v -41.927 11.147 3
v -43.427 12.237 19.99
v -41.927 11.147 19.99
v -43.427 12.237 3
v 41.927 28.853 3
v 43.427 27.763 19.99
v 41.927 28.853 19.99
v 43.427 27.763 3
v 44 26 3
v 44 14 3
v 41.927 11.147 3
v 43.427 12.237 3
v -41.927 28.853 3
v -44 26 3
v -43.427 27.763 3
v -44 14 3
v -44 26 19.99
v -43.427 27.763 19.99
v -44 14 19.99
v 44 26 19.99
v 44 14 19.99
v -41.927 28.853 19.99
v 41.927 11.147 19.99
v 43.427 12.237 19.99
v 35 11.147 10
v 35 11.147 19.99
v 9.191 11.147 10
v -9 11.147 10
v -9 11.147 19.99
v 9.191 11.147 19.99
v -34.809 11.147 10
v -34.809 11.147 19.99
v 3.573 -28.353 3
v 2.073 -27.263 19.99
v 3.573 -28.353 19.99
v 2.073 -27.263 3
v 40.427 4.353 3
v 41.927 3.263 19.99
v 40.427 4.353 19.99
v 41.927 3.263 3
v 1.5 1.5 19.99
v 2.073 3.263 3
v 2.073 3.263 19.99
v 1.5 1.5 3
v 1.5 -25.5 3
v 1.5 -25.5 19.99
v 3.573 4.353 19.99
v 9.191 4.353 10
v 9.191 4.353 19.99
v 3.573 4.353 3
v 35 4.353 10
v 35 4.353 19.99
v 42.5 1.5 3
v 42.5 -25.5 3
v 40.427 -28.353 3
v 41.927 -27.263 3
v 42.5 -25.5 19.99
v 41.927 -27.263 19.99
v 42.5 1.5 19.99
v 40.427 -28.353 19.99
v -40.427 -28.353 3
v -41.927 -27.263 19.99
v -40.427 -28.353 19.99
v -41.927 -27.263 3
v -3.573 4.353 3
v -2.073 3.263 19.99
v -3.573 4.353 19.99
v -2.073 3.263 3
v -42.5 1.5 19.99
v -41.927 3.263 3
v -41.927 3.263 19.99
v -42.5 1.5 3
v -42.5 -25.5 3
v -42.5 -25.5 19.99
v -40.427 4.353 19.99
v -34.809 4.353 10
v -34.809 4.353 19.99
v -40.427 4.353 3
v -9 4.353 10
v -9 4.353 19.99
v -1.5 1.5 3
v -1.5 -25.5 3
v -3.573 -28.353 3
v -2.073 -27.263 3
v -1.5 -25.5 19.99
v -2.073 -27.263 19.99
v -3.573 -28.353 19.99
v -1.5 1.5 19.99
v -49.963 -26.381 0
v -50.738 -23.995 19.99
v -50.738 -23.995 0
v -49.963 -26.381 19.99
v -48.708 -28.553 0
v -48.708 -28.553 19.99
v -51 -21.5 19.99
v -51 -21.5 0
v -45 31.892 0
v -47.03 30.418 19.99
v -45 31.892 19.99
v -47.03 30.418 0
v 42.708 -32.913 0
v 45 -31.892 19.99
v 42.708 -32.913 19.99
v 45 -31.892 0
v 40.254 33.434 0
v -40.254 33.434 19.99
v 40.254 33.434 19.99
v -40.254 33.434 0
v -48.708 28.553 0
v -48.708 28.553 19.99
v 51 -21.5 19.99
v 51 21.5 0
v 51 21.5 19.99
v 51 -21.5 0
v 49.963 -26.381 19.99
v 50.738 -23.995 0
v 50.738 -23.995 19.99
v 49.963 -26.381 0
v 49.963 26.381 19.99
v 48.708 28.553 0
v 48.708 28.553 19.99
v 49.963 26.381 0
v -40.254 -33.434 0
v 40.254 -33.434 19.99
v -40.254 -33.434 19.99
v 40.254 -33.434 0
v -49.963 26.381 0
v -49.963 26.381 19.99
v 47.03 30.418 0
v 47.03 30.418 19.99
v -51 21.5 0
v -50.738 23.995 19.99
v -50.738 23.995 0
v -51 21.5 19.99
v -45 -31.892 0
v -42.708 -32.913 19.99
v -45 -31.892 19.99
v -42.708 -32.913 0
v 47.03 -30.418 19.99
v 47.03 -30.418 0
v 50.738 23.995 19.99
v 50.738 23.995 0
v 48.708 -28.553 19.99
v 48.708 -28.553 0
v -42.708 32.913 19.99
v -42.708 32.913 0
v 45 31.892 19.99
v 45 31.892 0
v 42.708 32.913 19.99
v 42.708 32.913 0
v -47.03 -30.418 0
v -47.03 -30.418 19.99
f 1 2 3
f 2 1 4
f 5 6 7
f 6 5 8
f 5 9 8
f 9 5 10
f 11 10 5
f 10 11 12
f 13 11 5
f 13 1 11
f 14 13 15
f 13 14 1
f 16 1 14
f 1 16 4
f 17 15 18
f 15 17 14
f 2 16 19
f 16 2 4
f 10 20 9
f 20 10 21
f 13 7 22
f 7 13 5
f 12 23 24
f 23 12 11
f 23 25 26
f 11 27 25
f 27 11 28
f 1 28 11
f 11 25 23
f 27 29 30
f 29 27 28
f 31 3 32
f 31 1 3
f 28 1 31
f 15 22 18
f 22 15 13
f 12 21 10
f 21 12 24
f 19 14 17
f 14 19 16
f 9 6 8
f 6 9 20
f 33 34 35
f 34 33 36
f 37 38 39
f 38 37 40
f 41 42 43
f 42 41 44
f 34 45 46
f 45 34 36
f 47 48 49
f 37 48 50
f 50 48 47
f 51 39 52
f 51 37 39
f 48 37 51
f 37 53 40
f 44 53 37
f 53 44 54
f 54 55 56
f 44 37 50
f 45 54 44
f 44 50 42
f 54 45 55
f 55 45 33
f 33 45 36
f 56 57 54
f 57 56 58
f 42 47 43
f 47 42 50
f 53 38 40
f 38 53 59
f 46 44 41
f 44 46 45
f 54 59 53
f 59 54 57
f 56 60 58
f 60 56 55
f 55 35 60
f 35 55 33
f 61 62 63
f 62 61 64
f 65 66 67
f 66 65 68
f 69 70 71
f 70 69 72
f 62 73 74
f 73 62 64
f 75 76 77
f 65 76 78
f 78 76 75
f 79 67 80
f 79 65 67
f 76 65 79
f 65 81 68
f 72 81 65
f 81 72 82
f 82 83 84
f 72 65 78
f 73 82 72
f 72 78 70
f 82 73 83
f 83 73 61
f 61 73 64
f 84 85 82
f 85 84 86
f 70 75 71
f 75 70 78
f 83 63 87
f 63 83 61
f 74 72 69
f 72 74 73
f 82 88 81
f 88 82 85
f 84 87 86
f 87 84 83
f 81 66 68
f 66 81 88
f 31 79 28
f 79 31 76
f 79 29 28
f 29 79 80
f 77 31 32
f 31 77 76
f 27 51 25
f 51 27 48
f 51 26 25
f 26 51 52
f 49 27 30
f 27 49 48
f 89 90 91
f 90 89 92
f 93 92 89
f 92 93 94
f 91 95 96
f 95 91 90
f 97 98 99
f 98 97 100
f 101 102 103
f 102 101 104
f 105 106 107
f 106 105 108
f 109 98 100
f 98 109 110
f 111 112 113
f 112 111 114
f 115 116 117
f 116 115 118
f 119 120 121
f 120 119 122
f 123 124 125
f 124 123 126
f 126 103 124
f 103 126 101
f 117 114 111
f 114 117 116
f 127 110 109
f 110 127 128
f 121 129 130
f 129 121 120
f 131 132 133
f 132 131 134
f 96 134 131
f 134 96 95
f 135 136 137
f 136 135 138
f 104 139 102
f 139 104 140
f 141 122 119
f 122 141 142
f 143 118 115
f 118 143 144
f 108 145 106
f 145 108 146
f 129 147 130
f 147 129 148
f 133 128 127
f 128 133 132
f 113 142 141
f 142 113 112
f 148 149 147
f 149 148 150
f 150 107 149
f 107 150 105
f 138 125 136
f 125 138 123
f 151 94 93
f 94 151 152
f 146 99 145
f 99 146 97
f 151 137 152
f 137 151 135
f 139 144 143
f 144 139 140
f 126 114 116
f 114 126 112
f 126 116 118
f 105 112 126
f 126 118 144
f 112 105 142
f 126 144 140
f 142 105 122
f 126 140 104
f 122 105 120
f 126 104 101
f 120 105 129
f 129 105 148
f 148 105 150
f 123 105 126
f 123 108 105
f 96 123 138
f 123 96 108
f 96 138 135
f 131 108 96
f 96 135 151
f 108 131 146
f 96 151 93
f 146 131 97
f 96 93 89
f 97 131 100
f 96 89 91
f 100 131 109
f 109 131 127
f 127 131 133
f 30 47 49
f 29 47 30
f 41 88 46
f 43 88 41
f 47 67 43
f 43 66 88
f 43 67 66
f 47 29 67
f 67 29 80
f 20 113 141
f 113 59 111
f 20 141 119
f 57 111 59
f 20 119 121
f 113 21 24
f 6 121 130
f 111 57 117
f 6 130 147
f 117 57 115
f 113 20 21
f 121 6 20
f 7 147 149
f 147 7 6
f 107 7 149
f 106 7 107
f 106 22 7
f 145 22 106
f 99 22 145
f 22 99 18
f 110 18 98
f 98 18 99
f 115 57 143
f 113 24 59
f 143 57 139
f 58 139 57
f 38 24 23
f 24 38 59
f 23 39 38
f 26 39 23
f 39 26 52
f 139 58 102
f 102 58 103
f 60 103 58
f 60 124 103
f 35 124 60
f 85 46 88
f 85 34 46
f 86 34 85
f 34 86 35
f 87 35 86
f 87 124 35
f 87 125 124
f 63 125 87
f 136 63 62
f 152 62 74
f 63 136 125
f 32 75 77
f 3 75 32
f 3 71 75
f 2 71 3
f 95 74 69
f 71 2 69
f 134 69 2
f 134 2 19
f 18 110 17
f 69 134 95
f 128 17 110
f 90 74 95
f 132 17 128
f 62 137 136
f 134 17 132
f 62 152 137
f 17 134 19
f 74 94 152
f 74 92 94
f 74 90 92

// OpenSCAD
// Altoids tin insert

height = 20;
tin = [ 90, 55, height-0.01, 12 ]; // length, width, depth, corner radius

pockets = [
	[
		// Handle
		[ 85, 15, 17, 3 ], // L, W, D, R
		[ 0, 20, 0 ]       // Translation (x,y,z)
	],
	[
		// Top
		[ 38, 30, 17, 3 ], [ 22, -12, 0 ]
	],
	[
		// Bottom
		[ 38, 30, 17, 3 ], [ -22, -12, 0 ]
	],
	[
		// Thumb 1
		[ 25, 20, 10, 1 ], [ -22, 5, 0 ]
	],
	[
		// Thumb 2
		[ 25, 20, 10, 1 ], [ 22, 5, 0 ]
	],
];

difference()
{
	// Main tin
	roundedRect(tin);

	// Subtract pockets
	for (pocket = pockets)
	{
		pos = pocket[1];
		size = pocket[0];
		translate([ pos[0], pos[1], pos[2] + height - size[2] ])
		roundedRect(size);
	}
}

module roundedRect(size)
{
	// http://www.thingiverse.com/thing:9347
	x = size[0];
	y = size[1];
	z = size[2];
	radius = size[3];
	linear_extrude(height = z) hull()
	{
		// place 4 circles in the corners, with the given radius
		translate([ (-x / 2) + (radius / 2), (-y / 2) + (radius / 2), 0 ])
		circle(r = radius);

		translate([ (x / 2) - (radius / 2), (-y / 2) + (radius / 2), 0 ])
		circle(r = radius);

		translate([ (-x / 2) + (radius / 2), (y / 2) - (radius / 2), 0 ])
		circle(r = radius);

		translate([ (x / 2) - (radius / 2), (y / 2) - (radius / 2), 0 ])
		circle(r = radius);
	}
}
